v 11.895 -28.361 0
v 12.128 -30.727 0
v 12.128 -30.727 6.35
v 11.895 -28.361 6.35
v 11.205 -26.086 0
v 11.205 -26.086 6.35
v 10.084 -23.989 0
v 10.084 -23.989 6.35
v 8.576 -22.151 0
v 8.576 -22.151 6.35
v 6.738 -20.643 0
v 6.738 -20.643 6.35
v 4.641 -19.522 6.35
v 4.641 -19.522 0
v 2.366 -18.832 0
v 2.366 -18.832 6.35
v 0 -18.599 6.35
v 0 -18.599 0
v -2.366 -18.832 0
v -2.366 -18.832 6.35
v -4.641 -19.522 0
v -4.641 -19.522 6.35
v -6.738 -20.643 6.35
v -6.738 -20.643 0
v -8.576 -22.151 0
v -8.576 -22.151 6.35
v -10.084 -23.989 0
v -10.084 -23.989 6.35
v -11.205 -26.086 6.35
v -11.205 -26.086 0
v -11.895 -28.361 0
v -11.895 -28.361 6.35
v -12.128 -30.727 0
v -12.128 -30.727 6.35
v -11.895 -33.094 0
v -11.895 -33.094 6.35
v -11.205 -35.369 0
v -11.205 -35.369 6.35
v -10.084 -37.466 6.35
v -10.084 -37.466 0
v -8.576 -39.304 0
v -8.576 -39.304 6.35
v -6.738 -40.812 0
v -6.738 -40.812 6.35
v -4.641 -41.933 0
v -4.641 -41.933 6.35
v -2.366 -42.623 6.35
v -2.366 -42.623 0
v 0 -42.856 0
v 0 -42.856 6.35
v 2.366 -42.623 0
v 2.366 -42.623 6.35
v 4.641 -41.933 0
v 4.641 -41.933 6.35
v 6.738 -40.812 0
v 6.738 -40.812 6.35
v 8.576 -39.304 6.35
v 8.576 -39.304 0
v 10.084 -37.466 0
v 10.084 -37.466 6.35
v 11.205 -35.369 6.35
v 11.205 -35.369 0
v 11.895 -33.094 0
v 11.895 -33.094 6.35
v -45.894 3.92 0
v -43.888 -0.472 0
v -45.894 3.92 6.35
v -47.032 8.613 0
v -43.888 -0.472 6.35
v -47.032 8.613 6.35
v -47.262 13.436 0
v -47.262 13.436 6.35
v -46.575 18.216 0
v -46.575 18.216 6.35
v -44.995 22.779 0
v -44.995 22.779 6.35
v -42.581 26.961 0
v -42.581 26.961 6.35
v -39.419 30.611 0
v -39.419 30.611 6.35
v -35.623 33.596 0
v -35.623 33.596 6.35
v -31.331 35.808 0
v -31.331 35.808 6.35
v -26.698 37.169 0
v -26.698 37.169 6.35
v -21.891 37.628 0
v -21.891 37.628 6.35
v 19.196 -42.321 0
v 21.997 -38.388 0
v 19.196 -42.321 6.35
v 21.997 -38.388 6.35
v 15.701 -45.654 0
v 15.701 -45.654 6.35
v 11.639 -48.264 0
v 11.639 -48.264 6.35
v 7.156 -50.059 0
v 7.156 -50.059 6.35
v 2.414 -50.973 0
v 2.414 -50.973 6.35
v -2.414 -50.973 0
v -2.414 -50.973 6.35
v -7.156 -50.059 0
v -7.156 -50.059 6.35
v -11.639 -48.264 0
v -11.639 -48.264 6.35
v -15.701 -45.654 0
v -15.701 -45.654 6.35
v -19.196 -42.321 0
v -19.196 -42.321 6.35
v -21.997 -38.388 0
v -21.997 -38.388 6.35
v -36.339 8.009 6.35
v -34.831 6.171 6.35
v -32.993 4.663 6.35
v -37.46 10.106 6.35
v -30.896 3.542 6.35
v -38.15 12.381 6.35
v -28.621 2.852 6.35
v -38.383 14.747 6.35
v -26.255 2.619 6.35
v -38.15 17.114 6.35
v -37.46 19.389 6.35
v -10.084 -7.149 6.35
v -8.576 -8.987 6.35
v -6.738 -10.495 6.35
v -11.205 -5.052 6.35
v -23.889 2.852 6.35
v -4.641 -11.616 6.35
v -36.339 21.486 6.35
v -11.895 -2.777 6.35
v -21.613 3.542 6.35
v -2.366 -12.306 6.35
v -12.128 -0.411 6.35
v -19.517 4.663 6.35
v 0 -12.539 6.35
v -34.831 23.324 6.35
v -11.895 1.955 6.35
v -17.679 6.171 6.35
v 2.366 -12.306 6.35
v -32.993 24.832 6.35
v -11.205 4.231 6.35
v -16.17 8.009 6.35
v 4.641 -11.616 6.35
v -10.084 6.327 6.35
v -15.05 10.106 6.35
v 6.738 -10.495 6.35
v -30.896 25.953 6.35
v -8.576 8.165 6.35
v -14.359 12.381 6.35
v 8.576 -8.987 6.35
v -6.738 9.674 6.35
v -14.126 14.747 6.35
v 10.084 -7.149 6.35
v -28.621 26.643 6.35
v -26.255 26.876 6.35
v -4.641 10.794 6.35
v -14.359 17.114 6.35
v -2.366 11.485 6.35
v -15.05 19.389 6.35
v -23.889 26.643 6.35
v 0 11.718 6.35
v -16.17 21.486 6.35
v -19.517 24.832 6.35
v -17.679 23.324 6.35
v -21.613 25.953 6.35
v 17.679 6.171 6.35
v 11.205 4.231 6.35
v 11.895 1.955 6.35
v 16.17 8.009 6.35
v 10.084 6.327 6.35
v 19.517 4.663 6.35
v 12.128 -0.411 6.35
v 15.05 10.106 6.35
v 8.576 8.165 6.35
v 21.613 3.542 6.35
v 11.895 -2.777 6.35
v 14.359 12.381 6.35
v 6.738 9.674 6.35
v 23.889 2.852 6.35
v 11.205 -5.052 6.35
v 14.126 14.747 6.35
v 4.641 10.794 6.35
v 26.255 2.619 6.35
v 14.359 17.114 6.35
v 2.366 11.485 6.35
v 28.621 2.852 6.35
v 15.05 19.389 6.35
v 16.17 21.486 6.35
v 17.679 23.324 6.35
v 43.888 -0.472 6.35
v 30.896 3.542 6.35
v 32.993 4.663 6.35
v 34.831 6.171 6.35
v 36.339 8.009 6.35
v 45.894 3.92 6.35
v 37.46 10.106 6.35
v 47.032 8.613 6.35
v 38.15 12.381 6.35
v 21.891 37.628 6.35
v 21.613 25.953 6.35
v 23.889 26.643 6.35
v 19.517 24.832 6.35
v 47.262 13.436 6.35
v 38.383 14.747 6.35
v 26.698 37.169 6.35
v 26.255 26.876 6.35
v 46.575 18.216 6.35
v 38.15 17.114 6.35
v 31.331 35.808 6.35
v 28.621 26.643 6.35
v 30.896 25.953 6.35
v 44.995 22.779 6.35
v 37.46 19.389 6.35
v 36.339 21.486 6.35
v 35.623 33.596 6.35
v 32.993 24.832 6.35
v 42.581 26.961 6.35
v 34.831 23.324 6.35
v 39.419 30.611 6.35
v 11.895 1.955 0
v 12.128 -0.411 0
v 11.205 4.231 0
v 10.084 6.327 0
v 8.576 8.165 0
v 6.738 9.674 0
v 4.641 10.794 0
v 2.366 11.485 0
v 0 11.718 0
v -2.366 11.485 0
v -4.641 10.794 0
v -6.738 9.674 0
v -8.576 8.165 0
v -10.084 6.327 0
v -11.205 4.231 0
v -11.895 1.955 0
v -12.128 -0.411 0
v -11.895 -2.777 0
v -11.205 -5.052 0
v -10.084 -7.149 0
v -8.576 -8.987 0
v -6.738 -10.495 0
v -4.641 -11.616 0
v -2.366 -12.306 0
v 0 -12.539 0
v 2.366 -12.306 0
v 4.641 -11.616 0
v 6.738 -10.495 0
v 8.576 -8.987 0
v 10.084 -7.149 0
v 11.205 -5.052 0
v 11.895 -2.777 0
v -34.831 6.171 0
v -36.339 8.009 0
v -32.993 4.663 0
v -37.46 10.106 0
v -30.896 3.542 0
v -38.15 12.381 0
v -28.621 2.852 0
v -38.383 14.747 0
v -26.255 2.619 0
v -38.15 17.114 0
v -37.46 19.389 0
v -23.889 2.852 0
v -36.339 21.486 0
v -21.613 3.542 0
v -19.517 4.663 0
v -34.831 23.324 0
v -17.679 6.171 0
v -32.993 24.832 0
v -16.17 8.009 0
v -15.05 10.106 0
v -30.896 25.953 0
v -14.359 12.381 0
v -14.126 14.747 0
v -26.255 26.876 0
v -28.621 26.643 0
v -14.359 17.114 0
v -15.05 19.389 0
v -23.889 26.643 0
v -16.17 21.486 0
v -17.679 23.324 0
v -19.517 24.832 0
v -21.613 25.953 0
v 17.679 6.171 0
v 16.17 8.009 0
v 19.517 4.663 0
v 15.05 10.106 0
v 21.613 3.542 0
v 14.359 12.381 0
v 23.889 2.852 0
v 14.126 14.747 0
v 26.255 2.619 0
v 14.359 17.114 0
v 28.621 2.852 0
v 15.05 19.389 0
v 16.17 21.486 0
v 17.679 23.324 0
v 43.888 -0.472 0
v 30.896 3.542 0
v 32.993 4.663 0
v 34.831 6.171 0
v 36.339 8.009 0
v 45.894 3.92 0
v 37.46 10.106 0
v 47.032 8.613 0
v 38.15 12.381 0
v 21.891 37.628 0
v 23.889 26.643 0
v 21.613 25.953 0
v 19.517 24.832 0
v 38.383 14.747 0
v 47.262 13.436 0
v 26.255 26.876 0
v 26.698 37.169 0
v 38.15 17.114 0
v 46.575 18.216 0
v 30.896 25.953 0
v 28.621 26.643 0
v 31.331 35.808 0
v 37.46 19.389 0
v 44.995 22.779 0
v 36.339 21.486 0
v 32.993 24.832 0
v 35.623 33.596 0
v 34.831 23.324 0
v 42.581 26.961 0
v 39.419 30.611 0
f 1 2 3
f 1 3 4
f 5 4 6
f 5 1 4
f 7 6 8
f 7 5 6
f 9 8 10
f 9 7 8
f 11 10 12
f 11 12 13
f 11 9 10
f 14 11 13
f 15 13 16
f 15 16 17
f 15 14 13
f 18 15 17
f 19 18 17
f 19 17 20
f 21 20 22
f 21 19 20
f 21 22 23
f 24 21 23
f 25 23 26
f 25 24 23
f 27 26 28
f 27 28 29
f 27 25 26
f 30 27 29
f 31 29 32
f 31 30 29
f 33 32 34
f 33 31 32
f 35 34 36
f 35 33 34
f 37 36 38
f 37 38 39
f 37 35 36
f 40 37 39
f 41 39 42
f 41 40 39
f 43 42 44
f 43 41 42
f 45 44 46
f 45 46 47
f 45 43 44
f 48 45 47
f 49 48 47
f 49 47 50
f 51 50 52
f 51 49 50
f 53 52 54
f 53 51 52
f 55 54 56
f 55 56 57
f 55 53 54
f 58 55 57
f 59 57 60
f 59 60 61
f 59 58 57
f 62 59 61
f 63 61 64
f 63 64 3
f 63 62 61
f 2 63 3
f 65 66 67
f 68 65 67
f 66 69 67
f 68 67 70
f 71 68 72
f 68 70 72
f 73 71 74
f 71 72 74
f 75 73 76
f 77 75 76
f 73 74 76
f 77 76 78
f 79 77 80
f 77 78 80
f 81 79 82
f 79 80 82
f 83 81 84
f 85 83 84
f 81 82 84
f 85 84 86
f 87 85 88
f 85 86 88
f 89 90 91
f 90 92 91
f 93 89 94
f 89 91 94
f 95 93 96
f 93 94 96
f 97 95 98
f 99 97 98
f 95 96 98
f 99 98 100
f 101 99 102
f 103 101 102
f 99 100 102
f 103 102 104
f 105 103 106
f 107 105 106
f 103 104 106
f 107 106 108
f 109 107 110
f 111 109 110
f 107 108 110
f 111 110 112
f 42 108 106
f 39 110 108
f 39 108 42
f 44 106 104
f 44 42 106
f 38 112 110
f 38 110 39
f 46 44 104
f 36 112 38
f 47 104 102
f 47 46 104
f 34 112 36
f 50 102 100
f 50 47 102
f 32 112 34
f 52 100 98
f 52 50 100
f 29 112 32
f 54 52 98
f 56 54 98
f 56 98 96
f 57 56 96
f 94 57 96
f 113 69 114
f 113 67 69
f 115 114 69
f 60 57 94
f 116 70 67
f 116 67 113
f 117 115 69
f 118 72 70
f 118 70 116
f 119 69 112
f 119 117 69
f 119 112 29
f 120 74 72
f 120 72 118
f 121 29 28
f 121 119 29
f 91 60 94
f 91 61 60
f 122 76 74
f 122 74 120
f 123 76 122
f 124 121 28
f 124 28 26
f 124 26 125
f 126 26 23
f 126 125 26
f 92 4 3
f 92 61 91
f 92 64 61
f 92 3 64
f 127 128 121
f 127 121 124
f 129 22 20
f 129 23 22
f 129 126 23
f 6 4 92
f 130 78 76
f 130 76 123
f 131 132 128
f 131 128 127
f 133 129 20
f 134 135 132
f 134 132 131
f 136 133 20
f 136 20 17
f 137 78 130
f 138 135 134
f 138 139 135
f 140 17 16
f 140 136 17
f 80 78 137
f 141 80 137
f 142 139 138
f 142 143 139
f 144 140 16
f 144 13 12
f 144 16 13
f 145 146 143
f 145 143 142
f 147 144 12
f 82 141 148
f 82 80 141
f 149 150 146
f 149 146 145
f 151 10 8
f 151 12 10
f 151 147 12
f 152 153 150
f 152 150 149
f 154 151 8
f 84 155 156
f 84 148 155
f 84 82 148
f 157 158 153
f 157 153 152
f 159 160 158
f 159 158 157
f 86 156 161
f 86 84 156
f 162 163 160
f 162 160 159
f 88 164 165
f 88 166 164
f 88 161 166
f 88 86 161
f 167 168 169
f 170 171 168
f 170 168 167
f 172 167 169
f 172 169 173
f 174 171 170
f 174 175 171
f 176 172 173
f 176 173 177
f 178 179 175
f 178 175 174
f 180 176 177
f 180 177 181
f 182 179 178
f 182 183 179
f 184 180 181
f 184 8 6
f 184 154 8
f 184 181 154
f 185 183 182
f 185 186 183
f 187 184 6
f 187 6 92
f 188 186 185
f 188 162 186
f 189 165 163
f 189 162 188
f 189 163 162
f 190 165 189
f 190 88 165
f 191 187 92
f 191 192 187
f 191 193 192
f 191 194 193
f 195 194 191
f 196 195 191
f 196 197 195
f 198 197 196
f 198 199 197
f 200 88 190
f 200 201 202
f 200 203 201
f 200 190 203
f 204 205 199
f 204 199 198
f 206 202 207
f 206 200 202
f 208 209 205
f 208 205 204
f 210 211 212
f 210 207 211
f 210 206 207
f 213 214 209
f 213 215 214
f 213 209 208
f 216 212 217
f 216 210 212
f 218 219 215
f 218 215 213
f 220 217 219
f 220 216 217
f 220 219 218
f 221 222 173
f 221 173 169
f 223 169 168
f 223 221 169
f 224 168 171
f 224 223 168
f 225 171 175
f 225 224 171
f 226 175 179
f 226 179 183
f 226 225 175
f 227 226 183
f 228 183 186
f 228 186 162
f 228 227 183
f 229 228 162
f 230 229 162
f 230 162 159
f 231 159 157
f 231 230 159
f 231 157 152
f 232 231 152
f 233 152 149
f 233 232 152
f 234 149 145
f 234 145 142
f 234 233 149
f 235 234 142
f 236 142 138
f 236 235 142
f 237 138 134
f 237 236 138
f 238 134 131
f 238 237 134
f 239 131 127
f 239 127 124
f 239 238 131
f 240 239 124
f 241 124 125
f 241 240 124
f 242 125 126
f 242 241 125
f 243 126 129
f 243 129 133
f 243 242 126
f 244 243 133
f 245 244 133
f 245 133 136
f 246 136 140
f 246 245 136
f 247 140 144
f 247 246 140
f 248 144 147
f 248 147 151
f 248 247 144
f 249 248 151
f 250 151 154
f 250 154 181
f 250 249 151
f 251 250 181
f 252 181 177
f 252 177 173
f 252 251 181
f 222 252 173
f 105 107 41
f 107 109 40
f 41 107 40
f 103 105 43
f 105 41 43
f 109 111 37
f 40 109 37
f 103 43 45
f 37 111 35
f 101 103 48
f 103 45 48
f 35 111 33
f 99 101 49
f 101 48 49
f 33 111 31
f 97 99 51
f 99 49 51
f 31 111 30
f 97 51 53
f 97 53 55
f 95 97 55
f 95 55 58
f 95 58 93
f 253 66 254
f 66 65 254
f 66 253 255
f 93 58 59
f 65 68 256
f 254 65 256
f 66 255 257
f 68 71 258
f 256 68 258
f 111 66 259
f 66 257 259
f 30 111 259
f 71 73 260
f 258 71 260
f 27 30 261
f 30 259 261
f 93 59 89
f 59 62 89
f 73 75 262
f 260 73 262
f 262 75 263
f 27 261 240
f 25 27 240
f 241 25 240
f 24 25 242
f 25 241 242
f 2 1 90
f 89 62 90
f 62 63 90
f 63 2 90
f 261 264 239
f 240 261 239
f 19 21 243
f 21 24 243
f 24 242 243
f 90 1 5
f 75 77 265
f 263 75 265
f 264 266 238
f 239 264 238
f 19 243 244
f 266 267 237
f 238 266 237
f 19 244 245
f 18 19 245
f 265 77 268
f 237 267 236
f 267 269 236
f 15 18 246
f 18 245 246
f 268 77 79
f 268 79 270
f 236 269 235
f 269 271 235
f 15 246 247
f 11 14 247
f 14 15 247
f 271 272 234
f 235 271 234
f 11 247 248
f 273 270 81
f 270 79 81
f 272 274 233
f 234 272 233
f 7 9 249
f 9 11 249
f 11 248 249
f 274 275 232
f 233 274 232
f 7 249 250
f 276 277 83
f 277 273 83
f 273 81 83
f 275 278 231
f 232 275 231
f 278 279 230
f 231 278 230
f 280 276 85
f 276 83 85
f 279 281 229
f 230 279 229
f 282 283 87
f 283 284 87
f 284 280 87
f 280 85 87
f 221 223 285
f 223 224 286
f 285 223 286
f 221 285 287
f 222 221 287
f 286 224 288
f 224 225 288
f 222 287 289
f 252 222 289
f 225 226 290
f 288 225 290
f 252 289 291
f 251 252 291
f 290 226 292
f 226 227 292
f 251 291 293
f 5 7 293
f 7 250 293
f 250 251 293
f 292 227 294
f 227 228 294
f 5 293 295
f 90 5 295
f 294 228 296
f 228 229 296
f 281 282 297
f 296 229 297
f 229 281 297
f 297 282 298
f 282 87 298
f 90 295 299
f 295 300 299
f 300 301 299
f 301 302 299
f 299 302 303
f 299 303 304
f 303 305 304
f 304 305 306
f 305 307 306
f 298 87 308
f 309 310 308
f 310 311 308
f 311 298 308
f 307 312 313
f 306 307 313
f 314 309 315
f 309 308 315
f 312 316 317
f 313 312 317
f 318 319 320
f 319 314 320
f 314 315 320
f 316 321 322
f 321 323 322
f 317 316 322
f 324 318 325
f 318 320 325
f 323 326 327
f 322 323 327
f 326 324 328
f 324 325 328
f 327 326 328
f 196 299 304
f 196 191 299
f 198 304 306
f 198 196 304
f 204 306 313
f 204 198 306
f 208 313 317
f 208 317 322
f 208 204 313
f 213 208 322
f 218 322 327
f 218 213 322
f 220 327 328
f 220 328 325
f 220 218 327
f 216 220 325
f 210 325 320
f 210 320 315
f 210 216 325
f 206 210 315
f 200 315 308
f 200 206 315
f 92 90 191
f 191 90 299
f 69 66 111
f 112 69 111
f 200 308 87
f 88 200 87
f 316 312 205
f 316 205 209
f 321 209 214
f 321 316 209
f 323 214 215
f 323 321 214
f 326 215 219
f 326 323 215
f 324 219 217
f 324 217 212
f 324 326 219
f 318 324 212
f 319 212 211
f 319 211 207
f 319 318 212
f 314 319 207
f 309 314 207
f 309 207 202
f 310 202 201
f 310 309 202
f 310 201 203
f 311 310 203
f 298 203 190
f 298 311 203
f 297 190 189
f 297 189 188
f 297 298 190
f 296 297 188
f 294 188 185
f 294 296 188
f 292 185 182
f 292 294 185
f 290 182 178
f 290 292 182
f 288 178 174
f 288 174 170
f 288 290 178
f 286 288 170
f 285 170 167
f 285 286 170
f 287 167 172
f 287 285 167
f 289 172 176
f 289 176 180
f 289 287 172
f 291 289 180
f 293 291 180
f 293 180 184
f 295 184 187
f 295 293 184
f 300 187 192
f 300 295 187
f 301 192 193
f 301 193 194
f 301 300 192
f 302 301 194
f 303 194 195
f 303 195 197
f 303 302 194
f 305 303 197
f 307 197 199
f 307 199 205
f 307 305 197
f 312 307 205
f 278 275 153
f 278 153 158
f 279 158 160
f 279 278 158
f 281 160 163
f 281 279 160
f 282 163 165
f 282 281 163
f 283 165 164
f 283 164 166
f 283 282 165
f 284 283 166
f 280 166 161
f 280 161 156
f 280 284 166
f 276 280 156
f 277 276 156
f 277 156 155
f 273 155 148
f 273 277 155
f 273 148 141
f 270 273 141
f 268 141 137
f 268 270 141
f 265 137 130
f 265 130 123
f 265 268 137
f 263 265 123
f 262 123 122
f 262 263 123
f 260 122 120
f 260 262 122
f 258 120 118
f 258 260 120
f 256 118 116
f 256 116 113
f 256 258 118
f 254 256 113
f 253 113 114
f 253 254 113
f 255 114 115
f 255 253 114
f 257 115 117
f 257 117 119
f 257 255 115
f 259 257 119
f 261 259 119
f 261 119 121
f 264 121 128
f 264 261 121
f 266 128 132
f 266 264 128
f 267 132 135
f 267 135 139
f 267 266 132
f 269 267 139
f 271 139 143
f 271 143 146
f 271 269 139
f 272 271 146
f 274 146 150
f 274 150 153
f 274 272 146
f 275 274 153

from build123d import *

# Parameters (mm, degrees)
F0_R     = 12.1285
F1_DEPTH = 6.35
F2_R     = 25.4
F3_R     = 25.4
F4_R     = 25.4


with BuildPart() as f1:
    # F0 (on Top) → F1 (new body)
    with BuildSketch(Plane.XY):
        Polygon((0, -76.487995), (65.884729, 37.627703), (-65.884729, 37.627703), align=None)
        with Locations((0, -30.727365)):
            Circle(F0_R, mode=Mode.SUBTRACT)
        with Locations((0, -0.410863)):
            Circle(F0_R, mode=Mode.SUBTRACT)
        with Locations((-26.254852, 14.747383)):
            Circle(F0_R, mode=Mode.SUBTRACT)
        with Locations((26.254857, 14.747391)):
            Circle(F0_R, mode=Mode.SUBTRACT)
    extrude(amount=F1_DEPTH)

    # F2
    f2_edges = [f1.edges().sort_by_distance(p)[0] for p in [
        (-65.884729, 37.627703, 3.175),
    ]]
    fillet(f2_edges, radius=F2_R)

    # F3
    f3_edges = [f1.edges().sort_by_distance(p)[0] for p in [
        (65.884729, 37.627703, 3.175),
    ]]
    fillet(f3_edges, radius=F3_R)

    # F4
    f4_edges = [f1.edges().sort_by_distance(p)[0] for p in [
        (0, -76.487995, 3.175),
    ]]
    fillet(f4_edges, radius=F4_R)


solid = f1.part
